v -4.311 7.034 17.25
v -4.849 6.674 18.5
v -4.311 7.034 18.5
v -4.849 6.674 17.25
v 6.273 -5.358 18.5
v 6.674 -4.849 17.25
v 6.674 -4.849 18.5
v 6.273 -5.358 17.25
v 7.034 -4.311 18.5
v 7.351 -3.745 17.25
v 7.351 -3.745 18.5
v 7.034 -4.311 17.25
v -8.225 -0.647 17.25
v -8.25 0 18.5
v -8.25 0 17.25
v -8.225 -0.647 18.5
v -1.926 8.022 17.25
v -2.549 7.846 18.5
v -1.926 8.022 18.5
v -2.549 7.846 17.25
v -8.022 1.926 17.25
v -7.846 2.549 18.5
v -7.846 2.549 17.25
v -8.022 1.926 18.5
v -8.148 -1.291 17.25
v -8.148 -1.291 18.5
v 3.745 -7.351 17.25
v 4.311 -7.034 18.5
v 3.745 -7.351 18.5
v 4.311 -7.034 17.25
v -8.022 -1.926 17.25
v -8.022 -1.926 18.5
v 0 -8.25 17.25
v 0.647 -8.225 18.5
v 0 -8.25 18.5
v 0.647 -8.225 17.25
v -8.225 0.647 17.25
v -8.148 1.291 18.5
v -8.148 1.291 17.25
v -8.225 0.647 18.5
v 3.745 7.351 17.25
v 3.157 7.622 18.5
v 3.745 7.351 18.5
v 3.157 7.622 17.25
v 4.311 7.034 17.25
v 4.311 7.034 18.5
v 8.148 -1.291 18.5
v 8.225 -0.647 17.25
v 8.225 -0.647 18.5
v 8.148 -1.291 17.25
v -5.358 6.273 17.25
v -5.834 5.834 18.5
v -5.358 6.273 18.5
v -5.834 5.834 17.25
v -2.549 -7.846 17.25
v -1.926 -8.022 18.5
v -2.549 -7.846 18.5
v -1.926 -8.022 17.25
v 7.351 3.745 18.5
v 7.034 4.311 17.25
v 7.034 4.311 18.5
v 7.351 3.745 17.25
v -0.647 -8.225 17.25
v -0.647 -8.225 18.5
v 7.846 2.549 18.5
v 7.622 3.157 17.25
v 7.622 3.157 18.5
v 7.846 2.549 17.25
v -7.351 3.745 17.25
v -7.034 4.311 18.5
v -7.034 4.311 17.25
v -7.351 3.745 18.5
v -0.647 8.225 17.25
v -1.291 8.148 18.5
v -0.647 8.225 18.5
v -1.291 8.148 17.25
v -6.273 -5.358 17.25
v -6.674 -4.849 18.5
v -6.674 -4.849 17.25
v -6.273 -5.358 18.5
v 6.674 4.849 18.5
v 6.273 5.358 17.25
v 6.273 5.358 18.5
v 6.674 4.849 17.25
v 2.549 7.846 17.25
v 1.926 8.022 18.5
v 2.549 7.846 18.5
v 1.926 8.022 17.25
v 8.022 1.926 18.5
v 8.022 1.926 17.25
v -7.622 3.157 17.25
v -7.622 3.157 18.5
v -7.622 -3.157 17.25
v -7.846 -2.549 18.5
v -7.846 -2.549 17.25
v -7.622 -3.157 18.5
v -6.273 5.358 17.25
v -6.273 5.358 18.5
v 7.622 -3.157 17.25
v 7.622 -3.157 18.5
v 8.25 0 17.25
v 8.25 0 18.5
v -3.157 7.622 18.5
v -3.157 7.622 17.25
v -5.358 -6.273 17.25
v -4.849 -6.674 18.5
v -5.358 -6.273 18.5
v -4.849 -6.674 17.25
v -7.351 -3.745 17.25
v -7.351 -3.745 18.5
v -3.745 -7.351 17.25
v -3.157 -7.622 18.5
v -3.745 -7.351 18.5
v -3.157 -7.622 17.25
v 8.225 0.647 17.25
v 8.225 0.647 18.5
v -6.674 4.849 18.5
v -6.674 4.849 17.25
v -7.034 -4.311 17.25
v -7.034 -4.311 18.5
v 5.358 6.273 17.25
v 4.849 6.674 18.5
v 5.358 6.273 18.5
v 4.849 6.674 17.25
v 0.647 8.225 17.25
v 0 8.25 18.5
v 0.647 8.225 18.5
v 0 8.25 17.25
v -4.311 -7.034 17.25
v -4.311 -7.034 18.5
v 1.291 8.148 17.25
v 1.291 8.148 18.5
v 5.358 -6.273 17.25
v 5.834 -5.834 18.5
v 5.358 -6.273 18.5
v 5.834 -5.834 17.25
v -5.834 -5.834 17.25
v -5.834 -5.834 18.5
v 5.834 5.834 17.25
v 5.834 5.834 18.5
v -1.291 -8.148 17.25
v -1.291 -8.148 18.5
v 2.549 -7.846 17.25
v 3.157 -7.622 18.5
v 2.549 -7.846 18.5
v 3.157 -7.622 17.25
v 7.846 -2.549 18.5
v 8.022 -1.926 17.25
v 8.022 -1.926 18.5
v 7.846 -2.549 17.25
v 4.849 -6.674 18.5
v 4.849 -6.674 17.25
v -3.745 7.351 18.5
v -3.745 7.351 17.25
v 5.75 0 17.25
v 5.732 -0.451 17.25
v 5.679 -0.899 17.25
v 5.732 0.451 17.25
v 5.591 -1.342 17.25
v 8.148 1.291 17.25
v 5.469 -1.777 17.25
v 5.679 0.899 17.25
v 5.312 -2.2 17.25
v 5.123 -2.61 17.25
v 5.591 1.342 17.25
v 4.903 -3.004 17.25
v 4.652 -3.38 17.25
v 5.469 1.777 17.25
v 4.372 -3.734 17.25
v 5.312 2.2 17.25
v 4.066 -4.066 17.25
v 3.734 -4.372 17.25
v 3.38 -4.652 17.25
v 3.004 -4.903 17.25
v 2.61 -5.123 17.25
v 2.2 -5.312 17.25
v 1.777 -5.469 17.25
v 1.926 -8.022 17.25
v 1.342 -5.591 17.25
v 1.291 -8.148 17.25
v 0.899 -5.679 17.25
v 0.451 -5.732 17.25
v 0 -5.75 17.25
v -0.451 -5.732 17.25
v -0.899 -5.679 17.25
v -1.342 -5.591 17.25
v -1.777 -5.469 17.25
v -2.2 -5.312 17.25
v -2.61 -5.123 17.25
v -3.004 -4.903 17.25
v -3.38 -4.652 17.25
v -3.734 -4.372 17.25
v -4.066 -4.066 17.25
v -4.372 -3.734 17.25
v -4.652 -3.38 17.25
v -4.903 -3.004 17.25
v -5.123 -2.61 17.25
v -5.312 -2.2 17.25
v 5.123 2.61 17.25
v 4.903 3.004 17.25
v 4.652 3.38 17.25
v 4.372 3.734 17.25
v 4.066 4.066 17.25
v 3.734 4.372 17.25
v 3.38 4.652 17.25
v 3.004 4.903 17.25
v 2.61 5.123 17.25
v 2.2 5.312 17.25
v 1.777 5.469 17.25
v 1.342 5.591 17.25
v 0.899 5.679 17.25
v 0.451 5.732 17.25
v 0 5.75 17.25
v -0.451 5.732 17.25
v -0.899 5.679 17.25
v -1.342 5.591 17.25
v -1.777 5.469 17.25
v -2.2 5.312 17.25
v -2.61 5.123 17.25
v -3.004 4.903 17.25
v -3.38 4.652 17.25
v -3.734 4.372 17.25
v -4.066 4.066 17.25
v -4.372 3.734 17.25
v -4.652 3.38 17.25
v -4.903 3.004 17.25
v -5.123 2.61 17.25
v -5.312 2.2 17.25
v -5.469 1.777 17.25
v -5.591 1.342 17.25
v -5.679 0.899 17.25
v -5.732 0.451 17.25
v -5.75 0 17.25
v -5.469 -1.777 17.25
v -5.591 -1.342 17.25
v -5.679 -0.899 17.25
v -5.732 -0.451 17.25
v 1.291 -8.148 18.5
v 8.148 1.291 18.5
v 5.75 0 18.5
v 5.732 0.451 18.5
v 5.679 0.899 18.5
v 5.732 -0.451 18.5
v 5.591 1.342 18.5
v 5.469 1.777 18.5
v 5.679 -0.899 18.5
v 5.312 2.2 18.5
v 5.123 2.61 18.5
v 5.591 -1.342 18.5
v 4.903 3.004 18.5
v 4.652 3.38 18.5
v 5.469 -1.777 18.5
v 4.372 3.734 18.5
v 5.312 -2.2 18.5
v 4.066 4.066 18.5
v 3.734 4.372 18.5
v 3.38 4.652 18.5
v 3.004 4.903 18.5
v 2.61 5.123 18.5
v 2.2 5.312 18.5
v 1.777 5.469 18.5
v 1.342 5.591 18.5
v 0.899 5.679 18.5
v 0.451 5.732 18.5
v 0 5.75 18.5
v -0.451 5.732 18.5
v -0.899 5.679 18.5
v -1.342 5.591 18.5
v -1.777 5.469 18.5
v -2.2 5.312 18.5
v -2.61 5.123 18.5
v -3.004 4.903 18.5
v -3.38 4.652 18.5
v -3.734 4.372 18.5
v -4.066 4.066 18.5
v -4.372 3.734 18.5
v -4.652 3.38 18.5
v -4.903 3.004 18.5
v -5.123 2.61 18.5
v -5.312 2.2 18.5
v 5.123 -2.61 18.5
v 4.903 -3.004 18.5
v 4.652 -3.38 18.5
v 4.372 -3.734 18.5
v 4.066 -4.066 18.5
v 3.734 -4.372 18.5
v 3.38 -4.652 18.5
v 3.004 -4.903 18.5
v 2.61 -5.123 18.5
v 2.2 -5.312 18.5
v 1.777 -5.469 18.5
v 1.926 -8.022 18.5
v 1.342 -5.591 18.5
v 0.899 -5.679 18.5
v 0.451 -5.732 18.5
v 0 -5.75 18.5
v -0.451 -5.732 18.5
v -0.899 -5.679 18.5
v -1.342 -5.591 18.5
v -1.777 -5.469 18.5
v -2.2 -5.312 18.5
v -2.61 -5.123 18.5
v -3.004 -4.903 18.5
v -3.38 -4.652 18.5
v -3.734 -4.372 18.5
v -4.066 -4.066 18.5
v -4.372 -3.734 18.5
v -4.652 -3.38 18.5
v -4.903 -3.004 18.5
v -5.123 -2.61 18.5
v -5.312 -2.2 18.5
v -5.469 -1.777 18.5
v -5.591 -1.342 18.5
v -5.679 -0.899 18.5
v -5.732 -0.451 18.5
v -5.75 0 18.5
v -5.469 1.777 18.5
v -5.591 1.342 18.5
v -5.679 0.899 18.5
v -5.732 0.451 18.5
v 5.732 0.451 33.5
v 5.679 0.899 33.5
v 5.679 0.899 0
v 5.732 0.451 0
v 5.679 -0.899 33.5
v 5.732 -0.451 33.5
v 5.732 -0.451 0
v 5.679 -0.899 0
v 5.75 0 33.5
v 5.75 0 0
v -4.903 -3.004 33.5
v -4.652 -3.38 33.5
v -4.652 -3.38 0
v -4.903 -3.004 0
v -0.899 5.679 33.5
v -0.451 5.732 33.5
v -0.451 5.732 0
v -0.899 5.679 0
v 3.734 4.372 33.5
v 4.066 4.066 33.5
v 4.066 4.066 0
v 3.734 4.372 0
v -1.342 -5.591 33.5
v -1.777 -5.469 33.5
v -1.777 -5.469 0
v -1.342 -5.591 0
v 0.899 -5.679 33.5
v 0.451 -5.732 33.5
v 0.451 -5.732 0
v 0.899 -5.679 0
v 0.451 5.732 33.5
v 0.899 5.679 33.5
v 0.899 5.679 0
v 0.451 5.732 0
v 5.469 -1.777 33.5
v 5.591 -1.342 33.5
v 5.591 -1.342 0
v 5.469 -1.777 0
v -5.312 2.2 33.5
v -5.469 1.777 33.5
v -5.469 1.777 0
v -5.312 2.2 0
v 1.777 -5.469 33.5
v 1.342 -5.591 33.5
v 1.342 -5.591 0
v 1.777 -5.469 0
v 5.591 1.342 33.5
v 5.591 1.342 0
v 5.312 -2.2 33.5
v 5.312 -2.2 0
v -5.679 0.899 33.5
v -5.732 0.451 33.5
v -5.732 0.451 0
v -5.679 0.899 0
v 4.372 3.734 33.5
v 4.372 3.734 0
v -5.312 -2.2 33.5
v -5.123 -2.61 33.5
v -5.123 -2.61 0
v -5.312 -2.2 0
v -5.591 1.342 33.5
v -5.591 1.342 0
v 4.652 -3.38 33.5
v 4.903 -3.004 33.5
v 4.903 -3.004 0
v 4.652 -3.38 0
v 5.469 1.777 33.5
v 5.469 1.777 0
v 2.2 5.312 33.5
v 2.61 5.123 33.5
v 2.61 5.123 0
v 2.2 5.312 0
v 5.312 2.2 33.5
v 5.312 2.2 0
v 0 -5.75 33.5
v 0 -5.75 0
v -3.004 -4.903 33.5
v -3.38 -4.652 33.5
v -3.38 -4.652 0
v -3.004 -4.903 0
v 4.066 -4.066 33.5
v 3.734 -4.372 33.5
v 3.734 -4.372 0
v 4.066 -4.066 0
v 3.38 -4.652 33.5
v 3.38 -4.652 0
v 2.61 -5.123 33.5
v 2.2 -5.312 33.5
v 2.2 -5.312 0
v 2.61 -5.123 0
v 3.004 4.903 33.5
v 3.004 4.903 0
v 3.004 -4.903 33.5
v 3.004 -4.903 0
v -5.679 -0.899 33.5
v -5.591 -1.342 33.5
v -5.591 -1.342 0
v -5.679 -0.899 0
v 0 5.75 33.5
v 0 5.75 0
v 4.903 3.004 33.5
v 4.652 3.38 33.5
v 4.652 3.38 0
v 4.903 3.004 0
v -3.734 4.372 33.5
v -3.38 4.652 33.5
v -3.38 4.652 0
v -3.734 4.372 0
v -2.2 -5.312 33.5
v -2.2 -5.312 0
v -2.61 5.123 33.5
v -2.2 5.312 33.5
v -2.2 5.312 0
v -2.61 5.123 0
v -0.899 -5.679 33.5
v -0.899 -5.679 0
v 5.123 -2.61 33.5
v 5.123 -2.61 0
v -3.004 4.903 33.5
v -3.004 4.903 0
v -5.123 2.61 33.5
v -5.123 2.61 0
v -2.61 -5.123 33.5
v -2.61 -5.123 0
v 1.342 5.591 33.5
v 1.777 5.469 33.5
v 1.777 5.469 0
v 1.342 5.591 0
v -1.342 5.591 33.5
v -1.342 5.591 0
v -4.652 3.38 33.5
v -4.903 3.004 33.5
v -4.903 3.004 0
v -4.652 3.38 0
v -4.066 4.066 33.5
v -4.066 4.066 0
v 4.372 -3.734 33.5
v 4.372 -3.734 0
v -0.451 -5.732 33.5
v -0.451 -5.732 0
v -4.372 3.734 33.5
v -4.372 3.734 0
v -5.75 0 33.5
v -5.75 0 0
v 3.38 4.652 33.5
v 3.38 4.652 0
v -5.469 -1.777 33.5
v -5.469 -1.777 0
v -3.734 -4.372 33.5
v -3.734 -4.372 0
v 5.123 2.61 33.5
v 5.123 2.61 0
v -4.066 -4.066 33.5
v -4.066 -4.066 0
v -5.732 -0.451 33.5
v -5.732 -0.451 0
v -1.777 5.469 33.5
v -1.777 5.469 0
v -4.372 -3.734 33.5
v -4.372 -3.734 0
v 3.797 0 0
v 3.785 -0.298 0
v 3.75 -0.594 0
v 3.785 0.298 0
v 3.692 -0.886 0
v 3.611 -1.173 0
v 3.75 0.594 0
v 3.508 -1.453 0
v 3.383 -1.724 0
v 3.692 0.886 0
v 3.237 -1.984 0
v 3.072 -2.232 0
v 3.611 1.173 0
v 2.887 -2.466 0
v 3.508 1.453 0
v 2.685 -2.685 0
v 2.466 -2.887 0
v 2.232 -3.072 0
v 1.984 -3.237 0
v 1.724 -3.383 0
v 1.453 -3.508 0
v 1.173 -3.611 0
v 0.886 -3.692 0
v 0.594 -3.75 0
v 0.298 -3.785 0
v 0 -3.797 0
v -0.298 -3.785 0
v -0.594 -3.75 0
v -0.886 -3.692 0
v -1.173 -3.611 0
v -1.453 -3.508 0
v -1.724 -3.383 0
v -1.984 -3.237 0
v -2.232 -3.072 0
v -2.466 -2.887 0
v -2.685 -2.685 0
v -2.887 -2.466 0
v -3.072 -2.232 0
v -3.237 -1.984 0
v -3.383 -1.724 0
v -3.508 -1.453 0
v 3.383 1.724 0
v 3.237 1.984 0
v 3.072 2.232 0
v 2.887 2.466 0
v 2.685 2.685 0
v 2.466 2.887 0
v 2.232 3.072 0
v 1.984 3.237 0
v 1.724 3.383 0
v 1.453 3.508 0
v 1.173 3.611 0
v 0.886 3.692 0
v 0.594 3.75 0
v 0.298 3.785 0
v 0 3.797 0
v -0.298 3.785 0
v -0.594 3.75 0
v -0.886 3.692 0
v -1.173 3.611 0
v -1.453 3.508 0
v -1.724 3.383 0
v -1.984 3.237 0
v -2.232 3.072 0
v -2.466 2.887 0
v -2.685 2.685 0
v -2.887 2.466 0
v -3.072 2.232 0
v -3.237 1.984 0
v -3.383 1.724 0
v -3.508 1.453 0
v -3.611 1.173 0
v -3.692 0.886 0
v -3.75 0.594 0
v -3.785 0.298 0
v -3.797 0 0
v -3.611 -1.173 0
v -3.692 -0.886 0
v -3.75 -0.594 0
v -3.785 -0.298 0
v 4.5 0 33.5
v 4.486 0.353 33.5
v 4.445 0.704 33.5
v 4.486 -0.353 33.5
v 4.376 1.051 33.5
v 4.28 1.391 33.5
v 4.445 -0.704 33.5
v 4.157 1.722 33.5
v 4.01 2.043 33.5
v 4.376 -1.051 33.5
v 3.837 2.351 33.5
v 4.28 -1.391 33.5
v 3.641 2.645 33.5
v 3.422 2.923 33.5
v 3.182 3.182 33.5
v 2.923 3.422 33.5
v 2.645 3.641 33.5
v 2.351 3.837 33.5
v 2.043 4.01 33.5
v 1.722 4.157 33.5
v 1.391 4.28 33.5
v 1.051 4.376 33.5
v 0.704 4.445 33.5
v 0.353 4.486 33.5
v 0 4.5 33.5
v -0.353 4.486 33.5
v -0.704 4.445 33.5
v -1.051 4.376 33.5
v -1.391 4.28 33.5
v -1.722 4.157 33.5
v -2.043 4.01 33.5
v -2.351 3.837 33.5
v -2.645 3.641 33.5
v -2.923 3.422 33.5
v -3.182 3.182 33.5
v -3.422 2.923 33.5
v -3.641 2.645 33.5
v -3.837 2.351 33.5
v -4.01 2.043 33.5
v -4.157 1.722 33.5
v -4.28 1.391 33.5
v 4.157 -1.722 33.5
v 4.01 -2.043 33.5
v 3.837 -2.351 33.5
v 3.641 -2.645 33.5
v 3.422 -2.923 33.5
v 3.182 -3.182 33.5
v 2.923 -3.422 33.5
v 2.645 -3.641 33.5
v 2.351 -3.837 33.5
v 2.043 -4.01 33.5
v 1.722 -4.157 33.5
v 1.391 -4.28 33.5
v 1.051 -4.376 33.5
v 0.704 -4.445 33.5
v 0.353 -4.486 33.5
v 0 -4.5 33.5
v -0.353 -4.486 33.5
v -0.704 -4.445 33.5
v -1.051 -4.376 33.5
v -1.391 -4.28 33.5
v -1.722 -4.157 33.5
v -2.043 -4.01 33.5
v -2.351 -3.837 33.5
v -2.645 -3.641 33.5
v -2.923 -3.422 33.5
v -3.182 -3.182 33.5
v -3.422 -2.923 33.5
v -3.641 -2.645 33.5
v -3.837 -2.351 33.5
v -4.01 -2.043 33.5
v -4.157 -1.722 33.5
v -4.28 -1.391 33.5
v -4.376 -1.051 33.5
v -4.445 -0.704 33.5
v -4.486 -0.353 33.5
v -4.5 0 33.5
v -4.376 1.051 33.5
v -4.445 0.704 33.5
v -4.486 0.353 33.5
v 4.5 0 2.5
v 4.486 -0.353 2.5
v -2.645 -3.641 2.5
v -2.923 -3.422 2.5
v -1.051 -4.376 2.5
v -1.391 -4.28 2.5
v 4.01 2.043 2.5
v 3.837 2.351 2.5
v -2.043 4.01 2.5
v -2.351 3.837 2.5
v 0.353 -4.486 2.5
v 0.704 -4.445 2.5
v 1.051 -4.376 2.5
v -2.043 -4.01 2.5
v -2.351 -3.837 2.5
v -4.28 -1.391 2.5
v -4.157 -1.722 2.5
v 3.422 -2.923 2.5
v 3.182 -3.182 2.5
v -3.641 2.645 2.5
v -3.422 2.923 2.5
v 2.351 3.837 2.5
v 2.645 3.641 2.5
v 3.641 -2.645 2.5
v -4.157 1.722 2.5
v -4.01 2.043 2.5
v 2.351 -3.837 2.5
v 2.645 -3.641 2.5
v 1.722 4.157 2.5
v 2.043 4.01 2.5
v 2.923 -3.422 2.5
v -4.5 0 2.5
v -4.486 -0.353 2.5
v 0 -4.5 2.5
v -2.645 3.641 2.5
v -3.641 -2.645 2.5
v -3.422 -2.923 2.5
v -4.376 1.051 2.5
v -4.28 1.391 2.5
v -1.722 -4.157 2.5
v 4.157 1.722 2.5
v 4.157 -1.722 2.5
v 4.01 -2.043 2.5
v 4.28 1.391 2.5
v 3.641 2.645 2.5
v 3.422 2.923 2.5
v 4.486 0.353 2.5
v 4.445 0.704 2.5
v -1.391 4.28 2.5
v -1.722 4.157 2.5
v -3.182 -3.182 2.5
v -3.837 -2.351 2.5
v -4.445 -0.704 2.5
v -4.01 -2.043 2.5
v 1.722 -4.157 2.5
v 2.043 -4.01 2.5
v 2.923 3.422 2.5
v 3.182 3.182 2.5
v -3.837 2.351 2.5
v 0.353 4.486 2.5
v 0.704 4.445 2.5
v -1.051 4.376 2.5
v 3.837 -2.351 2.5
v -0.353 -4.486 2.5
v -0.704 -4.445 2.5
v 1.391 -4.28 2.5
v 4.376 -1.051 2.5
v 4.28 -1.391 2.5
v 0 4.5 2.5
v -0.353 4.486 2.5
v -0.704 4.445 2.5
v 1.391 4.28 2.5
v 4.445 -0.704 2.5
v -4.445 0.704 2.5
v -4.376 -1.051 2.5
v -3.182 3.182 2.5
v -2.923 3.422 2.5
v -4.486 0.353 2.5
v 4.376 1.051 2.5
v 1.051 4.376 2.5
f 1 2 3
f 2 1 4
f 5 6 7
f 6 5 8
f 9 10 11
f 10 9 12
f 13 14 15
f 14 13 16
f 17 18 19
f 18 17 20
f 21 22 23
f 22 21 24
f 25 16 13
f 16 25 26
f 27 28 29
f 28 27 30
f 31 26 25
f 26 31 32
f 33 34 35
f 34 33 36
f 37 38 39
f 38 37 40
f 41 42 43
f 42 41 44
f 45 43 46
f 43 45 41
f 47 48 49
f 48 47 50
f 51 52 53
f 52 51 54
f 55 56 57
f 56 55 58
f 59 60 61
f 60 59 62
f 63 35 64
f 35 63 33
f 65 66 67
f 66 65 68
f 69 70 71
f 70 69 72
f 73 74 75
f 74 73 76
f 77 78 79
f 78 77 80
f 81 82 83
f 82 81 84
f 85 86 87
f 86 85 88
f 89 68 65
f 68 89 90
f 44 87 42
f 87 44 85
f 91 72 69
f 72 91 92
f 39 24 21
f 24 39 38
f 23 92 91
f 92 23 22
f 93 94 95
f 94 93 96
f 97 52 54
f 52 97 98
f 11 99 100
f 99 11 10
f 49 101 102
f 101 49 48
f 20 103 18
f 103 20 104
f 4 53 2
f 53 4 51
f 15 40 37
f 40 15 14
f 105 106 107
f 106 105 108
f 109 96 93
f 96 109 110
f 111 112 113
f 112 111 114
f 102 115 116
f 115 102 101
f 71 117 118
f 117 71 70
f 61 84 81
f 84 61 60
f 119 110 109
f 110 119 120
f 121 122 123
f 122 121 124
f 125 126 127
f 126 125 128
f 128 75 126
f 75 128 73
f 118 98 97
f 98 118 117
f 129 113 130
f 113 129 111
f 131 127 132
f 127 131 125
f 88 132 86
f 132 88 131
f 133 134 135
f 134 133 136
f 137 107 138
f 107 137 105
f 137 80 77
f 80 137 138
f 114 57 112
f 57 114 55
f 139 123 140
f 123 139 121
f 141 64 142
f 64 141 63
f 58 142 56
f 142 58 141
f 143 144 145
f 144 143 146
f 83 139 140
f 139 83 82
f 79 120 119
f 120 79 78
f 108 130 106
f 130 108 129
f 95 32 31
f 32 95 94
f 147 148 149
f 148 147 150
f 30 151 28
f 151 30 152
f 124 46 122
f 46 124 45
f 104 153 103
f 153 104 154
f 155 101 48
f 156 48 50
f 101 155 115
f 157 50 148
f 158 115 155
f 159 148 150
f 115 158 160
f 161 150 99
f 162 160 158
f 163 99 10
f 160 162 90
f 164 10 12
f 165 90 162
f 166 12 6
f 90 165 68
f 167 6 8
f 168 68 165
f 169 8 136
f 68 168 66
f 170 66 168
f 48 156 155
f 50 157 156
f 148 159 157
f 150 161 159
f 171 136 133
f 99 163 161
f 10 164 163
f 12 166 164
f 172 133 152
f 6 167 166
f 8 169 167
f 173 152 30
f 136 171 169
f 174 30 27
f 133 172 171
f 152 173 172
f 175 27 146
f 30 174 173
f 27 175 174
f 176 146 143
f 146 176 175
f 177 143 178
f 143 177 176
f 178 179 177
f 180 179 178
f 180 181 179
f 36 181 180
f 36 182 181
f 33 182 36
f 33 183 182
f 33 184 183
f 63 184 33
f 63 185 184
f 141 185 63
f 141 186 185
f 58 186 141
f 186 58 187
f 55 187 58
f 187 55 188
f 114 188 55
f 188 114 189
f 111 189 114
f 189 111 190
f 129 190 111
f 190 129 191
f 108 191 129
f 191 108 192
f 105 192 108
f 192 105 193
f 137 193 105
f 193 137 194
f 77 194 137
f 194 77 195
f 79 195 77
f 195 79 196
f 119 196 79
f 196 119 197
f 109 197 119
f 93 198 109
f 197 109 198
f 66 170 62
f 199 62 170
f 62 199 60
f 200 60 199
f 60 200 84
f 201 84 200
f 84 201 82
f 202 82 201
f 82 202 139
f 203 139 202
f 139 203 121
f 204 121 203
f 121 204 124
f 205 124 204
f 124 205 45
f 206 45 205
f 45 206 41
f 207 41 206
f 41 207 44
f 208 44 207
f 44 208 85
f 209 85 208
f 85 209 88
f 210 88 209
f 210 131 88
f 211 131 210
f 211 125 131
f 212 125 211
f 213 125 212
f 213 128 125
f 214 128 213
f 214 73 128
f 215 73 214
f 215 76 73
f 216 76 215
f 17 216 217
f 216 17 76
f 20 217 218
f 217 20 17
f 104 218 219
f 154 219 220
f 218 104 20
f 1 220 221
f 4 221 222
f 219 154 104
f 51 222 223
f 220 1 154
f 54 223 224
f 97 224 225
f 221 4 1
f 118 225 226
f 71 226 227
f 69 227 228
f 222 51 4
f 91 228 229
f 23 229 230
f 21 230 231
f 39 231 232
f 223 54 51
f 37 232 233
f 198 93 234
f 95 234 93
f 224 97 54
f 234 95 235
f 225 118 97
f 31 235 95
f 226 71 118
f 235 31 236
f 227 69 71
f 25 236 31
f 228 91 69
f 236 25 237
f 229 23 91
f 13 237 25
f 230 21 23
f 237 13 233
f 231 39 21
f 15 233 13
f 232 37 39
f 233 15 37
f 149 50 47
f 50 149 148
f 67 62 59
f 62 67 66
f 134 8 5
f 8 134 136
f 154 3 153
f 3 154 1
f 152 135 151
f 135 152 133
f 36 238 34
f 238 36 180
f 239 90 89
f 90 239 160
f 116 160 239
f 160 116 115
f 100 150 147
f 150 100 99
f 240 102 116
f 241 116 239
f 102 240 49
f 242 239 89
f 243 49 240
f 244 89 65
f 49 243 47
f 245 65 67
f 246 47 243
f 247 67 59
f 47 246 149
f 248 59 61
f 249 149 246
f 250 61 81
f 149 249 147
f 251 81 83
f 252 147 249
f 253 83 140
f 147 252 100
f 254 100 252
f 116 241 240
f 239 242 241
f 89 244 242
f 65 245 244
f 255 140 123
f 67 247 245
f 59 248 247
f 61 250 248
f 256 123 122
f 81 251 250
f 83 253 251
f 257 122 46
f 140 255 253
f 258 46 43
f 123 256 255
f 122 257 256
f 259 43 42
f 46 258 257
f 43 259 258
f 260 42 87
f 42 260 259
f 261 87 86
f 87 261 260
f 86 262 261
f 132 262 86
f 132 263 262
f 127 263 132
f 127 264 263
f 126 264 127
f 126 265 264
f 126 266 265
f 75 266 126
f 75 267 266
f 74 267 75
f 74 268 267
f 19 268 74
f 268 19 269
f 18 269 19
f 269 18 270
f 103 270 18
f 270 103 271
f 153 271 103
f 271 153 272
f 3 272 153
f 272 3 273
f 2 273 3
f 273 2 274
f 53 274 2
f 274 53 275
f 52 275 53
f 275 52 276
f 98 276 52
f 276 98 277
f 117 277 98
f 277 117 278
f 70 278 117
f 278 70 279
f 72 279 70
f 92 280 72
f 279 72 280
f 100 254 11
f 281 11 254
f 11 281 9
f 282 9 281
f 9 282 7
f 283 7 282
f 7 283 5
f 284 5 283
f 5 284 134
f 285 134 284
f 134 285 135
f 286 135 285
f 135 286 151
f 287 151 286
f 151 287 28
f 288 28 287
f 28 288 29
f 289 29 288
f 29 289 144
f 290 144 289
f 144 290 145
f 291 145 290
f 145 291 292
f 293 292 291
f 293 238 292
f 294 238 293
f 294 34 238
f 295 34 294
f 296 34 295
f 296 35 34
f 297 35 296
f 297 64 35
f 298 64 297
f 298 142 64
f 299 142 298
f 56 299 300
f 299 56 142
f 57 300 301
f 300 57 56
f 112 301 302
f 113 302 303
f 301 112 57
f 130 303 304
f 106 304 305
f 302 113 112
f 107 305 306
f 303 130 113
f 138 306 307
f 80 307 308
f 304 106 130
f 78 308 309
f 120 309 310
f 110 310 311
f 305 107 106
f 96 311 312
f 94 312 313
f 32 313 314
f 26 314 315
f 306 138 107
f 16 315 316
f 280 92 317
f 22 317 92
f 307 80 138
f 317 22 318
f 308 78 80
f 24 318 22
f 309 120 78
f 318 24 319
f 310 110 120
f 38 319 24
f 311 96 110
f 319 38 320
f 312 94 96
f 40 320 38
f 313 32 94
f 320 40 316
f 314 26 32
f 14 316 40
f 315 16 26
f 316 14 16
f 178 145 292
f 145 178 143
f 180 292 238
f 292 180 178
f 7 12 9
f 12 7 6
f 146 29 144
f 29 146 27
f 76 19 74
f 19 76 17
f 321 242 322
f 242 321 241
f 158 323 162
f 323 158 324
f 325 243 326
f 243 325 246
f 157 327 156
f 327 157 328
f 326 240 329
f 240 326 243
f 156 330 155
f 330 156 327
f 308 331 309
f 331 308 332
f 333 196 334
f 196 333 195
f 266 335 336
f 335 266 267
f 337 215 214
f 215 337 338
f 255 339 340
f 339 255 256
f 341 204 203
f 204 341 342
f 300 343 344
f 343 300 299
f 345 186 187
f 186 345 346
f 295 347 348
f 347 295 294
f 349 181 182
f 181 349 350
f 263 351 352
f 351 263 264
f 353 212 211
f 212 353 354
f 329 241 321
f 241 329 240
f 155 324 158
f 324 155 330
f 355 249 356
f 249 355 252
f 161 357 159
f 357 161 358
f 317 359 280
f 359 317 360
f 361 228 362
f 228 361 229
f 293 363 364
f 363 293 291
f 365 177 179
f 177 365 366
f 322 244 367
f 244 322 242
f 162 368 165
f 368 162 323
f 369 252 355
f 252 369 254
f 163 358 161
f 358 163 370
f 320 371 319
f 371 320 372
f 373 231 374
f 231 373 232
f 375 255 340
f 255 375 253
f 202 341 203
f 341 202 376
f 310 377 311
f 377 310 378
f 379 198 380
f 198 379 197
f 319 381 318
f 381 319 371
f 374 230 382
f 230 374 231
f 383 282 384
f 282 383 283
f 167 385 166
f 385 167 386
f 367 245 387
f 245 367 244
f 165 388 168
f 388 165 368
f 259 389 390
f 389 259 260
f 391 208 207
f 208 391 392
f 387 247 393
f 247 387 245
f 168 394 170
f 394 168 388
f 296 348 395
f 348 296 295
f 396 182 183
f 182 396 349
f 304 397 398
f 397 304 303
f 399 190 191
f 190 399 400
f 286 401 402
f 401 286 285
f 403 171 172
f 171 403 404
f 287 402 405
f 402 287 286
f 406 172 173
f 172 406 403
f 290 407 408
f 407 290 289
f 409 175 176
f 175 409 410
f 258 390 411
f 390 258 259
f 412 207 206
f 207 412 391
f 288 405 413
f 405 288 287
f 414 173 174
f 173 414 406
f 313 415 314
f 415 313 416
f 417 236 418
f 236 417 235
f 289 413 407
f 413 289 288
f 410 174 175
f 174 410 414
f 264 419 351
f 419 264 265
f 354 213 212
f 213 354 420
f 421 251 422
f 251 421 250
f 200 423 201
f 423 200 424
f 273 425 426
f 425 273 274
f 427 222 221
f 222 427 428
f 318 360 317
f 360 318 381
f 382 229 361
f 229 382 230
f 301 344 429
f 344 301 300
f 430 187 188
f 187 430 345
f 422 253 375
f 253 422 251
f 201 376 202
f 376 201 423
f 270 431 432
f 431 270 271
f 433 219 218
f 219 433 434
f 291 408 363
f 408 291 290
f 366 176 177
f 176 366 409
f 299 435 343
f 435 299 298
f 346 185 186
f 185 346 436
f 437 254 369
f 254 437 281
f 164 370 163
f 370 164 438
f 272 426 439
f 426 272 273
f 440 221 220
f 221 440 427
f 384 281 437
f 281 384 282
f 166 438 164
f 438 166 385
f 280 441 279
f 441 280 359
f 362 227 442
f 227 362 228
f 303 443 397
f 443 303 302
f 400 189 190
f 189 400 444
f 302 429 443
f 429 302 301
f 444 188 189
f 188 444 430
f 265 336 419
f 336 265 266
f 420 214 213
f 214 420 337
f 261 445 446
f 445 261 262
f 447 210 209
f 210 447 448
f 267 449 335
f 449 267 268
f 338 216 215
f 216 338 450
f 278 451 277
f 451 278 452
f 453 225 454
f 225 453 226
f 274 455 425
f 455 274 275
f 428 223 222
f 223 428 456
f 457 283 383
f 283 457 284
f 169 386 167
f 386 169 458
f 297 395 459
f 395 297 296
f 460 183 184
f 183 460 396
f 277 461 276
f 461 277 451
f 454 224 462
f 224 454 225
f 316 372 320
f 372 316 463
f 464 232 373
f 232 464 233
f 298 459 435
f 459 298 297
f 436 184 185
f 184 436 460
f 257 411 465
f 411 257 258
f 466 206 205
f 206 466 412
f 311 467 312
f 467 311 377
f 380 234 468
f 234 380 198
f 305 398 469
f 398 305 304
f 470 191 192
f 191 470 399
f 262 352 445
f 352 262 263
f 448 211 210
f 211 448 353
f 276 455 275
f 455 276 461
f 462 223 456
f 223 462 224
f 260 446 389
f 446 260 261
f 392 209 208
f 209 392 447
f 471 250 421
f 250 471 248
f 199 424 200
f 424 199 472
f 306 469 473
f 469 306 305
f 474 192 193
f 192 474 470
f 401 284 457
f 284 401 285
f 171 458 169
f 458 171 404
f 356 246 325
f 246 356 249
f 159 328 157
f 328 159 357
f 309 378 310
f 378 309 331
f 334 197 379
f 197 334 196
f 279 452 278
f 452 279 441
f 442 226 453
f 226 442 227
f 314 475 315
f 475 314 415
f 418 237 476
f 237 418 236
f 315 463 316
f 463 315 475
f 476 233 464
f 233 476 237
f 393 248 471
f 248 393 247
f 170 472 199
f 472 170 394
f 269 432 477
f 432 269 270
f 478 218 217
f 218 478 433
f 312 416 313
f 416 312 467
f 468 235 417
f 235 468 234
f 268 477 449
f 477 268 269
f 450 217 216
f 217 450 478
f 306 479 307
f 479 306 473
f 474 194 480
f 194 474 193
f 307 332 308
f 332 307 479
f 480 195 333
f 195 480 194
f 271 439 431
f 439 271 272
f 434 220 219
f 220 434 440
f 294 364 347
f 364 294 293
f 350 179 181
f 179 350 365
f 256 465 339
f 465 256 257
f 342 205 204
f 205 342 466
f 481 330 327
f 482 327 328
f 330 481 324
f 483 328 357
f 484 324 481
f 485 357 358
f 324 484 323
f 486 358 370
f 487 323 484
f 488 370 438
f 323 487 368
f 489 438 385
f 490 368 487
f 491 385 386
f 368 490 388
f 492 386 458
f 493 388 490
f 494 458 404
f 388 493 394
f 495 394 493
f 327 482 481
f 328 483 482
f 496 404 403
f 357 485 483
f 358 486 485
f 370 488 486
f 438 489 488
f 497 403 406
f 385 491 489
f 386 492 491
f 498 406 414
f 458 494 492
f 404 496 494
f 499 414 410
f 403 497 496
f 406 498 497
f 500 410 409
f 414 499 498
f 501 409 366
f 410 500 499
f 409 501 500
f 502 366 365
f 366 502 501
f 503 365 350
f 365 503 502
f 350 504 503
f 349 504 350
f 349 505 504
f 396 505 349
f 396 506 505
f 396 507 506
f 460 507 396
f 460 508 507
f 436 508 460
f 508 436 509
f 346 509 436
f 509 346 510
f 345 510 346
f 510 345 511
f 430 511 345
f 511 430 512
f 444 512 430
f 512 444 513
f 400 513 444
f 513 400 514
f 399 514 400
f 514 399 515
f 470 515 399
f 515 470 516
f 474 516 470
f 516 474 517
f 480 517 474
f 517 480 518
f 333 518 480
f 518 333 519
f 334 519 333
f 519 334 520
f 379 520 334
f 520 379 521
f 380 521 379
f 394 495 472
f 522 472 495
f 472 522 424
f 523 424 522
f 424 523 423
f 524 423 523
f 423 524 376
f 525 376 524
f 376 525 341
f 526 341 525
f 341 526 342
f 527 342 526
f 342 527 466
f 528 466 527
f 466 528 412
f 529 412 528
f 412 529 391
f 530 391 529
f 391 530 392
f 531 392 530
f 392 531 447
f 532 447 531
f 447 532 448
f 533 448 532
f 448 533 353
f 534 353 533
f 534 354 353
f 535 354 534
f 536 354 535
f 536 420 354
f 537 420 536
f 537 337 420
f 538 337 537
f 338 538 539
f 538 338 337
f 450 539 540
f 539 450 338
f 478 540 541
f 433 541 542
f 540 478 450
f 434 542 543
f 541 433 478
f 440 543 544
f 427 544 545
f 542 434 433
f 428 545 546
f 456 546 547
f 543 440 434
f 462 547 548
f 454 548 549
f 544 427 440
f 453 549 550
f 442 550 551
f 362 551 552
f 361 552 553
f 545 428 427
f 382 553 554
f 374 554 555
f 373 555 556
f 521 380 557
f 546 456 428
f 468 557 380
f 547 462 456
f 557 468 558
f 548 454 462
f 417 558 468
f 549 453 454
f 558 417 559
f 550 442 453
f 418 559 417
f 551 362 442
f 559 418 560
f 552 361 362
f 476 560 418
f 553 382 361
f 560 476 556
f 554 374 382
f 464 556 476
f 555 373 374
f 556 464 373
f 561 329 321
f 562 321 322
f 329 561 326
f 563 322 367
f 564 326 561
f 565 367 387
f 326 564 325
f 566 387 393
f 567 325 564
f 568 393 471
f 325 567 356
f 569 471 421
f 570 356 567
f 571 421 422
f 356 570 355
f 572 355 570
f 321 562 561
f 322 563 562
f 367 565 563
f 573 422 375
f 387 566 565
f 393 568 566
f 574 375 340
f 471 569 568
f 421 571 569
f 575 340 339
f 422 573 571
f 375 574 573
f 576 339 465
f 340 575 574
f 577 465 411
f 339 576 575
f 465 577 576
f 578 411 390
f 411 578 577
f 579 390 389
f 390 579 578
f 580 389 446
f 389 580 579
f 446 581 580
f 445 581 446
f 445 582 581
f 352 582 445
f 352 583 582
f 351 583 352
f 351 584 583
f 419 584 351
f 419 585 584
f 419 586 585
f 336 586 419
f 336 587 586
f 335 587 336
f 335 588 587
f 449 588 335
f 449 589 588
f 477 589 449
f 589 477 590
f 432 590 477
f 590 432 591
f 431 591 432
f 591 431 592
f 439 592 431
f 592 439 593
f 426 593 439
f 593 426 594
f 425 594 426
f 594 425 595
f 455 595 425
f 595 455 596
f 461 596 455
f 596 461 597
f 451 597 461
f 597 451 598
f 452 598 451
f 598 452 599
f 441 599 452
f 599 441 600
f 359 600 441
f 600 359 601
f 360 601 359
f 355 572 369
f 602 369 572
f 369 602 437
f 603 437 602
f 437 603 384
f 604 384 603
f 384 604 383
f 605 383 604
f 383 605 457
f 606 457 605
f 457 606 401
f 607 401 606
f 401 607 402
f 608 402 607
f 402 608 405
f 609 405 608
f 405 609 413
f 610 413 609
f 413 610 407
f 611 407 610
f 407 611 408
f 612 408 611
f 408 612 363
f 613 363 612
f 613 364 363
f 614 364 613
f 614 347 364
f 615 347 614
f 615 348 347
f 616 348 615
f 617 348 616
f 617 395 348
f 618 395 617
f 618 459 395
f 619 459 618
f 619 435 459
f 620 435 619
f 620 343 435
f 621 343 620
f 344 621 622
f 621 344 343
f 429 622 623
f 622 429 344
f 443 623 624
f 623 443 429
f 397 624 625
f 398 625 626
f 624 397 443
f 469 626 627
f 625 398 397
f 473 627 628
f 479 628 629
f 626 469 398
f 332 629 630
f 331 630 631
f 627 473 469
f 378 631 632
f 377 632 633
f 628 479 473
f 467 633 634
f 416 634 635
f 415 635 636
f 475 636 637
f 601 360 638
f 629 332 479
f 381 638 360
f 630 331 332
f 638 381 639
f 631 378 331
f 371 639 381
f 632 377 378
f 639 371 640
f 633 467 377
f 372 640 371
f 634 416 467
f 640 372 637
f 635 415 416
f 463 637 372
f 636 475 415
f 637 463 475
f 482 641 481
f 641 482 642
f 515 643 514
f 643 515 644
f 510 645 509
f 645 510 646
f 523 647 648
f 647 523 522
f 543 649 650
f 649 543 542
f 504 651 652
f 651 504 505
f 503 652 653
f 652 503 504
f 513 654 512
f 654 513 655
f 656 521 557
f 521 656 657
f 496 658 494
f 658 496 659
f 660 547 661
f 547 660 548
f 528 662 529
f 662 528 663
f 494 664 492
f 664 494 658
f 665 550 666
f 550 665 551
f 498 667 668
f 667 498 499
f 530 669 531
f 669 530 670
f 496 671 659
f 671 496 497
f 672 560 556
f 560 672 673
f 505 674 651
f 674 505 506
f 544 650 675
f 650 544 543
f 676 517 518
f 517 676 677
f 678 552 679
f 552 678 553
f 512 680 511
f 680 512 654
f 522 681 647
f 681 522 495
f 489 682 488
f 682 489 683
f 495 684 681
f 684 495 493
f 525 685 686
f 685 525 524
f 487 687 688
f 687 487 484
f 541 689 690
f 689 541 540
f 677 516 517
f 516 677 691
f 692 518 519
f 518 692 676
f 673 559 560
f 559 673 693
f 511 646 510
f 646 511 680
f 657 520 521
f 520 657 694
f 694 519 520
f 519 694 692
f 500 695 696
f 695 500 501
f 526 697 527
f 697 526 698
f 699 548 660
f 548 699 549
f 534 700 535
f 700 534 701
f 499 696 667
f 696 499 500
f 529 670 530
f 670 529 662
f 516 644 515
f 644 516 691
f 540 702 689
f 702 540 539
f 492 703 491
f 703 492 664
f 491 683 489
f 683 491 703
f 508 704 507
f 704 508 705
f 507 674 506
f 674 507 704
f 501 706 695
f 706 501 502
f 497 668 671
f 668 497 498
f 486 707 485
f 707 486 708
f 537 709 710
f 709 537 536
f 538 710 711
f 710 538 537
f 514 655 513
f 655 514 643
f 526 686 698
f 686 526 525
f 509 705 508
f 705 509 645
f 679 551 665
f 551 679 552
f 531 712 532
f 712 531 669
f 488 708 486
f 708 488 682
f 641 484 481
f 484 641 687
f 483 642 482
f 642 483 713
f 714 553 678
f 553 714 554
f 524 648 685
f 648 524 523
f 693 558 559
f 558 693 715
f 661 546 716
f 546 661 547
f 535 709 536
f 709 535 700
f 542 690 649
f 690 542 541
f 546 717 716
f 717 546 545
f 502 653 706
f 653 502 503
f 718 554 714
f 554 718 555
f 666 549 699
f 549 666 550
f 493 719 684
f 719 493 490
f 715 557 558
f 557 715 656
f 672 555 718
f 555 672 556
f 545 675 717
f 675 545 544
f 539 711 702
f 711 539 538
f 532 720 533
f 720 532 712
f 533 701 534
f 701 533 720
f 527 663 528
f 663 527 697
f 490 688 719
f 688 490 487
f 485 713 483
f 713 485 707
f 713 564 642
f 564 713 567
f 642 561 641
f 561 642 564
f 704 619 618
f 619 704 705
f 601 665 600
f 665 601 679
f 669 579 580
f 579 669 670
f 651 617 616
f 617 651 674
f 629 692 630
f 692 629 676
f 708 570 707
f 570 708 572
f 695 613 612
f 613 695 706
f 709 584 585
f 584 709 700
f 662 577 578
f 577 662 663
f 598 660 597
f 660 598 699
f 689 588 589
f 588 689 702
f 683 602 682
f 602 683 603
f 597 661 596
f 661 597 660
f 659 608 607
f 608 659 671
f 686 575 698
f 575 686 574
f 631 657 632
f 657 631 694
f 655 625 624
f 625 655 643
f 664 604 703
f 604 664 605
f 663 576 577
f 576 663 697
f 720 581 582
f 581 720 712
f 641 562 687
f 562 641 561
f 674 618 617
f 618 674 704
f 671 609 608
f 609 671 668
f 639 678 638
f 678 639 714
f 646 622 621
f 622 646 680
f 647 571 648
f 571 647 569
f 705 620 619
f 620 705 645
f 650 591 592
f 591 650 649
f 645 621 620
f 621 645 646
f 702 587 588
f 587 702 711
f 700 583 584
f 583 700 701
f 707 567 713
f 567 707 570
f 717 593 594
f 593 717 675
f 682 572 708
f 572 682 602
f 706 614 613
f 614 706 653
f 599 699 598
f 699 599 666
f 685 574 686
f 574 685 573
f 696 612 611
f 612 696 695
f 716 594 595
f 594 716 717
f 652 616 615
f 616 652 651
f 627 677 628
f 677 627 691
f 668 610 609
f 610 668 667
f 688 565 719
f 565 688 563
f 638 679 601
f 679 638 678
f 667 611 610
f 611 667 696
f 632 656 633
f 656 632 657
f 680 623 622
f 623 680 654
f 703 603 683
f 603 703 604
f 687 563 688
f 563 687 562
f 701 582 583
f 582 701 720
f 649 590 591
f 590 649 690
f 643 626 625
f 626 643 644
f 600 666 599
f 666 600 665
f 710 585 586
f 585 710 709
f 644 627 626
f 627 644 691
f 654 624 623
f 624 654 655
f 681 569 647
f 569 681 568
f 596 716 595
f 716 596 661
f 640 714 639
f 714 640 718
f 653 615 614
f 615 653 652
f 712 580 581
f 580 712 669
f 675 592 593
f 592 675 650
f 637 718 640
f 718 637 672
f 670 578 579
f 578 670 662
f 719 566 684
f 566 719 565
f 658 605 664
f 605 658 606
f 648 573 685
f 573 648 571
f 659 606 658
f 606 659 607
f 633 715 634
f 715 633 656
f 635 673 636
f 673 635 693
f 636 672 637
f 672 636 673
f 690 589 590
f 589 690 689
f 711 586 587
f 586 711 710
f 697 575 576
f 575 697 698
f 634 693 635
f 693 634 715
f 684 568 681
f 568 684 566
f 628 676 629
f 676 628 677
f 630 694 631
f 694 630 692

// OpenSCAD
// file: common.scad
// Measurements and routines common across adapters.

band_full_thickness = 1.25;    // thickest point of the band
band_full_diameter = 16.5;  // diameter at widest point of band

// profile = [
//     [0,0],
//     [band_edge_diameter / 2, 0],
//     [band_full_diameter / 2, (band_full_thickness - band_edge_thickness) / 2],
//     [band_full_diameter / 2, band_full_thickness - ((band_full_thickness - band_edge_thickness) / 2)],
//     [band_edge_diameter / 2, band_full_thickness],
//     [0,band_full_thickness],
// ];

profile = [
    [0,0],
    [band_full_diameter / 2, 0],
    [band_full_diameter / 2, band_full_thickness],
    [0,band_full_thickness],
];

module band() {
    rotate_extrude($fn=80) polygon(points=profile);
}
// main file
// Plotter adapter for the KOH-I-NOOR Toison D'Or pencil
//
// Modified by Sasha Kovar <sasha-thing@arcocene.org>
// from a design by Brian Boucheron <brian@boucheron.org>

include <common.scad>;

body_outer_diameter = 11.5; // outer diameter of the main body
body_inner_diameter = 9;
body_height = 13.5;

translate([0,0,33.5]) 
rotate([180,0,0])
translate([0,0,15]) 
difference() {
    union() {
        band();
        cylinder(r=body_outer_diameter/2, h=body_height + 5, $fn=80);
        translate([0,0,-15]) cylinder(r=body_outer_diameter/2, h=body_height + 5, $fn=80);
    }

    translate([0,0,2])
    union() {
        translate([0,0,-20]) cylinder(d=body_inner_diameter, h=34, $fn=80);
        intersection() {
            translate([0,0,-5.5]) cylinder(d=body_inner_diameter, h=24, $fn=80);
            translate([0,0,14]) cylinder(d1=body_inner_diameter, d2=0, h=16, $fn=80);
        }
    }
}
